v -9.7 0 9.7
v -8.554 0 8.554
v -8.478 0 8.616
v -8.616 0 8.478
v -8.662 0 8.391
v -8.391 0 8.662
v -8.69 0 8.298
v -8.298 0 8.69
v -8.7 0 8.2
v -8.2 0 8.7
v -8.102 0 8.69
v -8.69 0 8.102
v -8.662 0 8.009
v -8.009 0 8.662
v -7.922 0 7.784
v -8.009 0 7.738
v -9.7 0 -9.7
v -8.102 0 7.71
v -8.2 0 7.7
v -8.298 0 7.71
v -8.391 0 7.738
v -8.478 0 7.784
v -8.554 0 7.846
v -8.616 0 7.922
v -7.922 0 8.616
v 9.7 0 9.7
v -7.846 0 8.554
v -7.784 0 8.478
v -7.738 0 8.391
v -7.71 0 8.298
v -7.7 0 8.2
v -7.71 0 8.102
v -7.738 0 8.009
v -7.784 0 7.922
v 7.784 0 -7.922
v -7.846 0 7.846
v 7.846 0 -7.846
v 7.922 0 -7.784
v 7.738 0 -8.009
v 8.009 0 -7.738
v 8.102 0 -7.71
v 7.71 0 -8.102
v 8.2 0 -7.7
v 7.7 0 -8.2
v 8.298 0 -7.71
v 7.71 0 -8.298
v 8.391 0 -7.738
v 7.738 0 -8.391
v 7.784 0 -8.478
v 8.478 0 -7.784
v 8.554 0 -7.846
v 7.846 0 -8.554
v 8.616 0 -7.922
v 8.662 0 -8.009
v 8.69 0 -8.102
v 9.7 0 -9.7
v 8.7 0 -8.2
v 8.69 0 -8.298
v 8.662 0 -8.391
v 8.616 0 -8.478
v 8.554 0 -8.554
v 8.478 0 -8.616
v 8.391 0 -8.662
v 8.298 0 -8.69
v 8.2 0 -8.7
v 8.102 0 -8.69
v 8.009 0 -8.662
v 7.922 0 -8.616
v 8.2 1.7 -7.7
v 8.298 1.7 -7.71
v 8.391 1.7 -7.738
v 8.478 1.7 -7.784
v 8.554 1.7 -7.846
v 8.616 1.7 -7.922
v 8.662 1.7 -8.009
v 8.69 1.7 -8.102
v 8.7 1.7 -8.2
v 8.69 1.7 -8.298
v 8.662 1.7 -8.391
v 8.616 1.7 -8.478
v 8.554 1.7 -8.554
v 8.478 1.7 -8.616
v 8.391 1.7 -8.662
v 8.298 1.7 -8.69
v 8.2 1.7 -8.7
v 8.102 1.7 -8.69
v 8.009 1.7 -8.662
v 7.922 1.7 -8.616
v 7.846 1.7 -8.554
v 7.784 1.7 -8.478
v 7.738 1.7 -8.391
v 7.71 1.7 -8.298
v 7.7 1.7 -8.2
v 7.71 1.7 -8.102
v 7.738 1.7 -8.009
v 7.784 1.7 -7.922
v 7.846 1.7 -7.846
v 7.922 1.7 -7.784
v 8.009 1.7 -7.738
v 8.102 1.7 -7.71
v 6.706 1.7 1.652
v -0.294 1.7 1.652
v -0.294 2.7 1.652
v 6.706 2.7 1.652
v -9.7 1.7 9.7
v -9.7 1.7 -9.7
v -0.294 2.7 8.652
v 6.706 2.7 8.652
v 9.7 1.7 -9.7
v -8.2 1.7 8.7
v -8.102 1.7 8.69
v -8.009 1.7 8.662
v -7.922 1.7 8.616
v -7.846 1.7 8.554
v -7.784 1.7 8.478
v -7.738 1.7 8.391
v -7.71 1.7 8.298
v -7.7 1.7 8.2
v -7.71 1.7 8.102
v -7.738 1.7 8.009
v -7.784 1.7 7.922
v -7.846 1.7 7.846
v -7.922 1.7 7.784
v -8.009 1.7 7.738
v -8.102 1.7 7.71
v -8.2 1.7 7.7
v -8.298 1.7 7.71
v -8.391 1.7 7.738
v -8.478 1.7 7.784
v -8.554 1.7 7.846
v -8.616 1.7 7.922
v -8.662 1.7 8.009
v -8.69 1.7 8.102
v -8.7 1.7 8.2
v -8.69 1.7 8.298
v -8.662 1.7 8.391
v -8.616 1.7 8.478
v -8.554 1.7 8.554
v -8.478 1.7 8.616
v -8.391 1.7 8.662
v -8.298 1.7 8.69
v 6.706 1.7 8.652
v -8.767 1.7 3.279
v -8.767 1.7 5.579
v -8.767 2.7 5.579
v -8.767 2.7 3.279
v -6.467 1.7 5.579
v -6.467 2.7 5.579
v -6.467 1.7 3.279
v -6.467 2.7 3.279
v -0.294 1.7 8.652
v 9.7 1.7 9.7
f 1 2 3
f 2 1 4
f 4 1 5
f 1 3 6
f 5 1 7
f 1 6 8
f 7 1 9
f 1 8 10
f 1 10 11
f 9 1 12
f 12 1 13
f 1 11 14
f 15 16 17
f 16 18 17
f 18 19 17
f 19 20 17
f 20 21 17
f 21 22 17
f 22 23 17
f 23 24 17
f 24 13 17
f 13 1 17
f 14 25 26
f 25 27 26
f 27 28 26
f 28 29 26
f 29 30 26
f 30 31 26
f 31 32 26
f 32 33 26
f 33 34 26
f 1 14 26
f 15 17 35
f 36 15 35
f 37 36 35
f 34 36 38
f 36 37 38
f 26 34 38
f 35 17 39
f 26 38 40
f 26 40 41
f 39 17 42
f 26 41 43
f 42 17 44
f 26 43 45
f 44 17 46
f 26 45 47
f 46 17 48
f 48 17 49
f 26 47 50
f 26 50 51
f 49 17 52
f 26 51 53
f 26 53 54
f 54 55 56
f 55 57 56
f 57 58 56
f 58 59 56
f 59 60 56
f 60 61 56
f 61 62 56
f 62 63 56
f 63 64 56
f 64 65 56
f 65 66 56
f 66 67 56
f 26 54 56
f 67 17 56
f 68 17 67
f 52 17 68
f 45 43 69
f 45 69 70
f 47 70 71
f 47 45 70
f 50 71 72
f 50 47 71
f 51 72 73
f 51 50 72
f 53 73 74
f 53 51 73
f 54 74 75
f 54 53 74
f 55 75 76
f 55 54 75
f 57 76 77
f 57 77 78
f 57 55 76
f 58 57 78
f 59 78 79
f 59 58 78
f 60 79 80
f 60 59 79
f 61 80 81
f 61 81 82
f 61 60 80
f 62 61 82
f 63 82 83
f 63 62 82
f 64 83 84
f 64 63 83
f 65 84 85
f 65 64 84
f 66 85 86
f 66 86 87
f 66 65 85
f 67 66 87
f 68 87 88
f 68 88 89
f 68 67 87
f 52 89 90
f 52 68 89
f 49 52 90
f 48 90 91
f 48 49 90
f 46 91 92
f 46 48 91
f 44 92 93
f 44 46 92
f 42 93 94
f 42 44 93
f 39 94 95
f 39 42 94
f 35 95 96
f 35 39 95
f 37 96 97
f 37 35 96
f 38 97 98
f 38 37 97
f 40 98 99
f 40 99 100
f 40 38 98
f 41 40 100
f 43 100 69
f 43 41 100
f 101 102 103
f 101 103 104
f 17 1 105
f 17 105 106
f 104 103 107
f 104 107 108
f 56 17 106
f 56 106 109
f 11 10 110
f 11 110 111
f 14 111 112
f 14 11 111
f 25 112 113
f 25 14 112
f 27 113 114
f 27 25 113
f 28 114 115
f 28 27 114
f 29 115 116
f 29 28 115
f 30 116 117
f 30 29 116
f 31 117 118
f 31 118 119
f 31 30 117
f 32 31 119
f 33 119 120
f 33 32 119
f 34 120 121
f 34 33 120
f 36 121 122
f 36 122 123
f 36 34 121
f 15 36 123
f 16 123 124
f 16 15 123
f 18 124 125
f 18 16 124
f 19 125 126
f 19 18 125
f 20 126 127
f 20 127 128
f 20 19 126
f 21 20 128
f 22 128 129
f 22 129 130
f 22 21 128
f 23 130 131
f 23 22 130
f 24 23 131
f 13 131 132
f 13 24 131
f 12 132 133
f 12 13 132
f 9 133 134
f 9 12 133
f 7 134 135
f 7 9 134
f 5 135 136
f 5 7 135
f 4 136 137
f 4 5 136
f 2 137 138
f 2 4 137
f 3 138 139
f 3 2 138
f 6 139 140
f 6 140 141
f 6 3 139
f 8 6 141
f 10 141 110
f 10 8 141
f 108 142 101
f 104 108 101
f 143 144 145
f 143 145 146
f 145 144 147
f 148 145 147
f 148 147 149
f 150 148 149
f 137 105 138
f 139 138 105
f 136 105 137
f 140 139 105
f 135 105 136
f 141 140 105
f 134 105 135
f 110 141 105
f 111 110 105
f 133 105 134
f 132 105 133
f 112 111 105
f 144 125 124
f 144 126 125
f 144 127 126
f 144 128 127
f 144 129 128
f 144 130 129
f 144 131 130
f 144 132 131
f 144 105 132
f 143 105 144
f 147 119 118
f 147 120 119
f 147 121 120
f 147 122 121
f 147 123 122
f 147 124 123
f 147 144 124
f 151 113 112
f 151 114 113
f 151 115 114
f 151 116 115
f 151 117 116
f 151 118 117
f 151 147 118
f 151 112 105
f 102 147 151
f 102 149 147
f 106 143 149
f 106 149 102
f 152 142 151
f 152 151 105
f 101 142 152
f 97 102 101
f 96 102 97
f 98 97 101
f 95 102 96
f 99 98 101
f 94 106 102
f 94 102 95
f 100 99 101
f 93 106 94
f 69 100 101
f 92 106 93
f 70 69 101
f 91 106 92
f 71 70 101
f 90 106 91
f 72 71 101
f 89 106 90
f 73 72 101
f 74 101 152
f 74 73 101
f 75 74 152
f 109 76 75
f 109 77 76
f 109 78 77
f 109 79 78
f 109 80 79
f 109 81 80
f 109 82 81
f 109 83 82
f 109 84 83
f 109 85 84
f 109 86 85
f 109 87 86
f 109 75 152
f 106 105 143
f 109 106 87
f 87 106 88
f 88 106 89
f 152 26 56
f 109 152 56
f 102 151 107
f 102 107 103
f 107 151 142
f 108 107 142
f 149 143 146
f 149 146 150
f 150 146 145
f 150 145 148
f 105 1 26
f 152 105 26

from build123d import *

# Parameters (mm, degrees)
SKETCH1_W           = 19.4
SKETCH1_H           = 19.4
SKETCH1_R           = 0.5
BOSS_EXTRUDE1_DEPTH = 1.7
SKETCH2_W           = 7
SKETCH2_H           = 7
SKETCH2_W_2         = 2.3
SKETCH2_H_2         = 2.3
BOSS_EXTRUDE2_DEPTH = 1


with BuildPart() as part:
    # Sketch1 → Boss-Extrude1 (new body)
    with BuildSketch(Plane(origin=(0, 0, 0), x_dir=(1, 0, 0), z_dir=(0, 1, 0))):
        Rectangle(SKETCH1_W, SKETCH1_H)
        with Locations(Location((-8.2, -8.2, 0), (0, 0, 270))):
            Circle(SKETCH1_R, mode=Mode.SUBTRACT)
        with Locations(Location((8.2, 8.2, 0), (0, 0, 270))):
            Circle(SKETCH1_R, mode=Mode.SUBTRACT)
    extrude(amount=BOSS_EXTRUDE1_DEPTH)

    # Sketch2 → Boss-Extrude2 (add)
    with BuildSketch(Plane(origin=(0, 1.7, 0), x_dir=(1, 0, 0), z_dir=(0, 1, 0))):
        with Locations((3.206065648, -5.151943642)):
            Rectangle(SKETCH2_W, SKETCH2_H)
        with Locations((-7.616722435, -4.429188959)):
            Rectangle(SKETCH2_W_2, SKETCH2_H_2)
    extrude(amount=BOSS_EXTRUDE2_DEPTH)


solid = part.part
